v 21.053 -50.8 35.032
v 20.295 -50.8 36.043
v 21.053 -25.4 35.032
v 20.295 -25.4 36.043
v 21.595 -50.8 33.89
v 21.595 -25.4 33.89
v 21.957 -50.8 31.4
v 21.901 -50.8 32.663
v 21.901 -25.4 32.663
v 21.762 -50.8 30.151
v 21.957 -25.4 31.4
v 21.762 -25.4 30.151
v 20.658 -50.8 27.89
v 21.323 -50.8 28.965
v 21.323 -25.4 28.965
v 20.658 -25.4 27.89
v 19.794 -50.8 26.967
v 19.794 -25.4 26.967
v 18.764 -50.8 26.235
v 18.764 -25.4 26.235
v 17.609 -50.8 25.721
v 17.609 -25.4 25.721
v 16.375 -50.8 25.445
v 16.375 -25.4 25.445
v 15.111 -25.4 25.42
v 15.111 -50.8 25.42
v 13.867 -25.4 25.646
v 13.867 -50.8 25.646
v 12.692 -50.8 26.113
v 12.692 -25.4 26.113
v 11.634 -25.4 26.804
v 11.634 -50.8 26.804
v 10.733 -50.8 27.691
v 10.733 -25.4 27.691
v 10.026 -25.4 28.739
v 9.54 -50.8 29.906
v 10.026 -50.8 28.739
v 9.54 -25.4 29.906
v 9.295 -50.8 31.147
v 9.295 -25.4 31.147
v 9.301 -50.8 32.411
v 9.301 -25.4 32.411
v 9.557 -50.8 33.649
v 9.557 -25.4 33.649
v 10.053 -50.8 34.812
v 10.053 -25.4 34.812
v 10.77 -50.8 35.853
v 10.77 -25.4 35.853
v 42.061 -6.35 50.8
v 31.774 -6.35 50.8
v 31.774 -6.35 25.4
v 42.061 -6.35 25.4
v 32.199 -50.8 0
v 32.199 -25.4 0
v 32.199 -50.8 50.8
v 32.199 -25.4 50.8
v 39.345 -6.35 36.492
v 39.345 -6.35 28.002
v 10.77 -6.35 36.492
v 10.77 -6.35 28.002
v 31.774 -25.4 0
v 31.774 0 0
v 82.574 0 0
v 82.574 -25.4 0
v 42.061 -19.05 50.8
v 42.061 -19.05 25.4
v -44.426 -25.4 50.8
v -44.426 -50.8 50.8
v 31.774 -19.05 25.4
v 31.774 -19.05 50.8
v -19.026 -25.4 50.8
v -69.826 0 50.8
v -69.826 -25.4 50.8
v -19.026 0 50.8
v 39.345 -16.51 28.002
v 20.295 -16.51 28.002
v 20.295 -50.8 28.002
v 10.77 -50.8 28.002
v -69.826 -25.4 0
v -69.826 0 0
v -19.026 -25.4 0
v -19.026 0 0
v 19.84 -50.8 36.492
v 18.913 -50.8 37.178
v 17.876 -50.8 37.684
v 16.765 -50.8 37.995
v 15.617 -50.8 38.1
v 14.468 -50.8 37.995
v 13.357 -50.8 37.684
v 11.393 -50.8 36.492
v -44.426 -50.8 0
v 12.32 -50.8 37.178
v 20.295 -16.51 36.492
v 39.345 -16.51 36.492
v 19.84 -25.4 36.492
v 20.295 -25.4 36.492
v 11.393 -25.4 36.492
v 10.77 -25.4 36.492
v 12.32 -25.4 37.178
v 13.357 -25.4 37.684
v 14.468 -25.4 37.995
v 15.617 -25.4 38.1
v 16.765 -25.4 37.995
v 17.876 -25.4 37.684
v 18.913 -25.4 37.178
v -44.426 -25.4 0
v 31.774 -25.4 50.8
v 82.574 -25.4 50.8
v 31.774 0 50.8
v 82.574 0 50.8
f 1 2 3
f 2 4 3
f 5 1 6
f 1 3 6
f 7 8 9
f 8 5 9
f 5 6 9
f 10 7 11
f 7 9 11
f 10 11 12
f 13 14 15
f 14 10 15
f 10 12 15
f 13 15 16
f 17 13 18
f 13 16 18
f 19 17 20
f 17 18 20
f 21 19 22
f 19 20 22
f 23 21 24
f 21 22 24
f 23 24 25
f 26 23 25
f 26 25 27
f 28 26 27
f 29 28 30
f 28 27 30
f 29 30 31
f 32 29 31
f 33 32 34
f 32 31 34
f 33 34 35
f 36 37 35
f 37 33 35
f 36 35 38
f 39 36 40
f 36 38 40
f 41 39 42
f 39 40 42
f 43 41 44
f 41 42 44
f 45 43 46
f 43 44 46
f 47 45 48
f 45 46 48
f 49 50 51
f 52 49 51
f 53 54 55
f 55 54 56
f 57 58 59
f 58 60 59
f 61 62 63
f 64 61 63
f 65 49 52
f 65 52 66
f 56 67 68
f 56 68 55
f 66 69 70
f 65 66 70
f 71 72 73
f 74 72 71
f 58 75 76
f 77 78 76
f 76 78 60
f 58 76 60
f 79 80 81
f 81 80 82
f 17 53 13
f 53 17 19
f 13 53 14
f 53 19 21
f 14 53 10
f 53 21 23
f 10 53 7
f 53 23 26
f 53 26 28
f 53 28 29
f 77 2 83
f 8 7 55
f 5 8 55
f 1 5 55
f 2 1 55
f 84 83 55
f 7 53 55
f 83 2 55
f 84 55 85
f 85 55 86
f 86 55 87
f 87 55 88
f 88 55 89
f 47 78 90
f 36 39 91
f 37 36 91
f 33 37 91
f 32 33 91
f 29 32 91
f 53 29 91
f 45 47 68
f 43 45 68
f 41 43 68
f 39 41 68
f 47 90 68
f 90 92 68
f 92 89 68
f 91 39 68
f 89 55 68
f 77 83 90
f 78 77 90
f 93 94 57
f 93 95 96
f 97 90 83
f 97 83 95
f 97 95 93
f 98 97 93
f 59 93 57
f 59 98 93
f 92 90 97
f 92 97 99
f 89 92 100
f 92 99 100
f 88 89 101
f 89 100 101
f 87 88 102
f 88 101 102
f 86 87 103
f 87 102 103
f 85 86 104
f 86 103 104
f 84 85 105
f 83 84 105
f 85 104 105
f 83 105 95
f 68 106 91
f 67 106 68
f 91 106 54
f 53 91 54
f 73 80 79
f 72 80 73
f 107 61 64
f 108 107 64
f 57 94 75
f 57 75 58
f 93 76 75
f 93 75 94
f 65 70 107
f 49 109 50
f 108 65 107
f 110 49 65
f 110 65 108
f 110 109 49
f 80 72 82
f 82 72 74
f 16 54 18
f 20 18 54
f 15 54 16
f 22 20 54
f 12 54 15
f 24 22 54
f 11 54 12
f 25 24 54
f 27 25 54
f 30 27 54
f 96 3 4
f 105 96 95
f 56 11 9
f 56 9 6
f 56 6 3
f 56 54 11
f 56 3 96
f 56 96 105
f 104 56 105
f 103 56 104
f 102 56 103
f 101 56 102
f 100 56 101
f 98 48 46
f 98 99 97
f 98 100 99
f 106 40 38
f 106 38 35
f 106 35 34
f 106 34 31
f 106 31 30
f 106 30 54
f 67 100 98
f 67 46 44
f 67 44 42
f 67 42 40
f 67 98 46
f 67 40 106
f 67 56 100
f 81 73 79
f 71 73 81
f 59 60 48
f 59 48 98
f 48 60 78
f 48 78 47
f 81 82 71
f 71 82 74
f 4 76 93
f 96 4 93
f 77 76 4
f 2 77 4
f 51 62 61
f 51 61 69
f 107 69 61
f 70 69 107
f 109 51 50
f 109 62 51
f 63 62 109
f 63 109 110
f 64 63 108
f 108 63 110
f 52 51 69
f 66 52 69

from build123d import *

# Parameters (mm, degrees)
F0_W          = 50.8
F0_H          = 50.8
F1_DEPTH      = 25.4
F2_W          = 76.6248404759
F2_H          = 50.8
F3_DEPTH      = 25.4
F4_R          = 6.35
F5_DEPTH      = 25.4
F7_DEPTH      = 10.287
F8_W          = 9.525
F8_H          = 8.4898080677
F9_DEPTH      = 25.4
F9_DEPTH_BACK = 19.05
F10_W         = 10.16
F10_H         = 8.4898080677
F11_DEPTH     = 19.05


with BuildPart() as f1:
    # F0 (on Front) → F1 (new body)
    with BuildSketch(Plane.XZ):
        with Locations((57.1738270503, 25.4)):
            Rectangle(F0_W, F0_H)
    extrude(amount=F1_DEPTH)

    # F6 (on face) → F7 (cut)
    with BuildSketch(Plane(origin=(31.7738270503, 0, 0), x_dir=(0, -1, 0), z_dir=(-1, 0, 0))):
        Polygon((6.35, 50.8), (6.35, 25.4), (19.05, 25.4), (19.05, 42.4634665251), (19.05, 50.8), align=None)
    extrude(amount=-F7_DEPTH, mode=Mode.SUBTRACT)


with BuildPart() as f1b:
    # F0 (on Front) → F1, piece 2 (new body)
    with BuildSketch(Plane.XZ):
        with Locations((-44.4261729497, 25.4)):
            Rectangle(F0_W, F0_H)
    extrude(amount=F1_DEPTH)


with BuildPart() as f3:
    # F2 (on face) → F3 (new body)
    with BuildSketch(Plane.XZ.offset(25.4)):
        with Locations((-6.1137527117, 25.4)):
            Rectangle(F2_W, F2_H)
    extrude(amount=F3_DEPTH)

    # F4 (on face) → F5 (cut)
    with BuildSketch(Plane(origin=(0, -25.4, 0), x_dir=(-1, 0, 0), z_dir=(0, 1, 0))):
        with Locations((-15.61657805, 31.75)):
            Circle(F4_R)
    extrude(amount=-F5_DEPTH, mode=Mode.SUBTRACT)

    # F8 (on face) → F9 (join, two sides)
    with BuildSketch(Plane(origin=(0, -25.4, 0), x_dir=(-1, 0, 0), z_dir=(0, 1, 0))) as f9_sk:
        with Locations((-15.5326598912, 32.2467396036)):
            Rectangle(F8_W, F8_H)
    extrude(amount=-F9_DEPTH)
    extrude(f9_sk.sketch, amount=F9_DEPTH_BACK)

    # F10 (on face) → F11 (join)
    with BuildSketch(Plane.YZ.offset(20.2951598912)):
        with Locations((-11.43, 32.2467396036)):
            Rectangle(F10_W, F10_H)
    extrude(amount=F11_DEPTH)


solid = Compound([f1.part, f1b.part, f3.part])
